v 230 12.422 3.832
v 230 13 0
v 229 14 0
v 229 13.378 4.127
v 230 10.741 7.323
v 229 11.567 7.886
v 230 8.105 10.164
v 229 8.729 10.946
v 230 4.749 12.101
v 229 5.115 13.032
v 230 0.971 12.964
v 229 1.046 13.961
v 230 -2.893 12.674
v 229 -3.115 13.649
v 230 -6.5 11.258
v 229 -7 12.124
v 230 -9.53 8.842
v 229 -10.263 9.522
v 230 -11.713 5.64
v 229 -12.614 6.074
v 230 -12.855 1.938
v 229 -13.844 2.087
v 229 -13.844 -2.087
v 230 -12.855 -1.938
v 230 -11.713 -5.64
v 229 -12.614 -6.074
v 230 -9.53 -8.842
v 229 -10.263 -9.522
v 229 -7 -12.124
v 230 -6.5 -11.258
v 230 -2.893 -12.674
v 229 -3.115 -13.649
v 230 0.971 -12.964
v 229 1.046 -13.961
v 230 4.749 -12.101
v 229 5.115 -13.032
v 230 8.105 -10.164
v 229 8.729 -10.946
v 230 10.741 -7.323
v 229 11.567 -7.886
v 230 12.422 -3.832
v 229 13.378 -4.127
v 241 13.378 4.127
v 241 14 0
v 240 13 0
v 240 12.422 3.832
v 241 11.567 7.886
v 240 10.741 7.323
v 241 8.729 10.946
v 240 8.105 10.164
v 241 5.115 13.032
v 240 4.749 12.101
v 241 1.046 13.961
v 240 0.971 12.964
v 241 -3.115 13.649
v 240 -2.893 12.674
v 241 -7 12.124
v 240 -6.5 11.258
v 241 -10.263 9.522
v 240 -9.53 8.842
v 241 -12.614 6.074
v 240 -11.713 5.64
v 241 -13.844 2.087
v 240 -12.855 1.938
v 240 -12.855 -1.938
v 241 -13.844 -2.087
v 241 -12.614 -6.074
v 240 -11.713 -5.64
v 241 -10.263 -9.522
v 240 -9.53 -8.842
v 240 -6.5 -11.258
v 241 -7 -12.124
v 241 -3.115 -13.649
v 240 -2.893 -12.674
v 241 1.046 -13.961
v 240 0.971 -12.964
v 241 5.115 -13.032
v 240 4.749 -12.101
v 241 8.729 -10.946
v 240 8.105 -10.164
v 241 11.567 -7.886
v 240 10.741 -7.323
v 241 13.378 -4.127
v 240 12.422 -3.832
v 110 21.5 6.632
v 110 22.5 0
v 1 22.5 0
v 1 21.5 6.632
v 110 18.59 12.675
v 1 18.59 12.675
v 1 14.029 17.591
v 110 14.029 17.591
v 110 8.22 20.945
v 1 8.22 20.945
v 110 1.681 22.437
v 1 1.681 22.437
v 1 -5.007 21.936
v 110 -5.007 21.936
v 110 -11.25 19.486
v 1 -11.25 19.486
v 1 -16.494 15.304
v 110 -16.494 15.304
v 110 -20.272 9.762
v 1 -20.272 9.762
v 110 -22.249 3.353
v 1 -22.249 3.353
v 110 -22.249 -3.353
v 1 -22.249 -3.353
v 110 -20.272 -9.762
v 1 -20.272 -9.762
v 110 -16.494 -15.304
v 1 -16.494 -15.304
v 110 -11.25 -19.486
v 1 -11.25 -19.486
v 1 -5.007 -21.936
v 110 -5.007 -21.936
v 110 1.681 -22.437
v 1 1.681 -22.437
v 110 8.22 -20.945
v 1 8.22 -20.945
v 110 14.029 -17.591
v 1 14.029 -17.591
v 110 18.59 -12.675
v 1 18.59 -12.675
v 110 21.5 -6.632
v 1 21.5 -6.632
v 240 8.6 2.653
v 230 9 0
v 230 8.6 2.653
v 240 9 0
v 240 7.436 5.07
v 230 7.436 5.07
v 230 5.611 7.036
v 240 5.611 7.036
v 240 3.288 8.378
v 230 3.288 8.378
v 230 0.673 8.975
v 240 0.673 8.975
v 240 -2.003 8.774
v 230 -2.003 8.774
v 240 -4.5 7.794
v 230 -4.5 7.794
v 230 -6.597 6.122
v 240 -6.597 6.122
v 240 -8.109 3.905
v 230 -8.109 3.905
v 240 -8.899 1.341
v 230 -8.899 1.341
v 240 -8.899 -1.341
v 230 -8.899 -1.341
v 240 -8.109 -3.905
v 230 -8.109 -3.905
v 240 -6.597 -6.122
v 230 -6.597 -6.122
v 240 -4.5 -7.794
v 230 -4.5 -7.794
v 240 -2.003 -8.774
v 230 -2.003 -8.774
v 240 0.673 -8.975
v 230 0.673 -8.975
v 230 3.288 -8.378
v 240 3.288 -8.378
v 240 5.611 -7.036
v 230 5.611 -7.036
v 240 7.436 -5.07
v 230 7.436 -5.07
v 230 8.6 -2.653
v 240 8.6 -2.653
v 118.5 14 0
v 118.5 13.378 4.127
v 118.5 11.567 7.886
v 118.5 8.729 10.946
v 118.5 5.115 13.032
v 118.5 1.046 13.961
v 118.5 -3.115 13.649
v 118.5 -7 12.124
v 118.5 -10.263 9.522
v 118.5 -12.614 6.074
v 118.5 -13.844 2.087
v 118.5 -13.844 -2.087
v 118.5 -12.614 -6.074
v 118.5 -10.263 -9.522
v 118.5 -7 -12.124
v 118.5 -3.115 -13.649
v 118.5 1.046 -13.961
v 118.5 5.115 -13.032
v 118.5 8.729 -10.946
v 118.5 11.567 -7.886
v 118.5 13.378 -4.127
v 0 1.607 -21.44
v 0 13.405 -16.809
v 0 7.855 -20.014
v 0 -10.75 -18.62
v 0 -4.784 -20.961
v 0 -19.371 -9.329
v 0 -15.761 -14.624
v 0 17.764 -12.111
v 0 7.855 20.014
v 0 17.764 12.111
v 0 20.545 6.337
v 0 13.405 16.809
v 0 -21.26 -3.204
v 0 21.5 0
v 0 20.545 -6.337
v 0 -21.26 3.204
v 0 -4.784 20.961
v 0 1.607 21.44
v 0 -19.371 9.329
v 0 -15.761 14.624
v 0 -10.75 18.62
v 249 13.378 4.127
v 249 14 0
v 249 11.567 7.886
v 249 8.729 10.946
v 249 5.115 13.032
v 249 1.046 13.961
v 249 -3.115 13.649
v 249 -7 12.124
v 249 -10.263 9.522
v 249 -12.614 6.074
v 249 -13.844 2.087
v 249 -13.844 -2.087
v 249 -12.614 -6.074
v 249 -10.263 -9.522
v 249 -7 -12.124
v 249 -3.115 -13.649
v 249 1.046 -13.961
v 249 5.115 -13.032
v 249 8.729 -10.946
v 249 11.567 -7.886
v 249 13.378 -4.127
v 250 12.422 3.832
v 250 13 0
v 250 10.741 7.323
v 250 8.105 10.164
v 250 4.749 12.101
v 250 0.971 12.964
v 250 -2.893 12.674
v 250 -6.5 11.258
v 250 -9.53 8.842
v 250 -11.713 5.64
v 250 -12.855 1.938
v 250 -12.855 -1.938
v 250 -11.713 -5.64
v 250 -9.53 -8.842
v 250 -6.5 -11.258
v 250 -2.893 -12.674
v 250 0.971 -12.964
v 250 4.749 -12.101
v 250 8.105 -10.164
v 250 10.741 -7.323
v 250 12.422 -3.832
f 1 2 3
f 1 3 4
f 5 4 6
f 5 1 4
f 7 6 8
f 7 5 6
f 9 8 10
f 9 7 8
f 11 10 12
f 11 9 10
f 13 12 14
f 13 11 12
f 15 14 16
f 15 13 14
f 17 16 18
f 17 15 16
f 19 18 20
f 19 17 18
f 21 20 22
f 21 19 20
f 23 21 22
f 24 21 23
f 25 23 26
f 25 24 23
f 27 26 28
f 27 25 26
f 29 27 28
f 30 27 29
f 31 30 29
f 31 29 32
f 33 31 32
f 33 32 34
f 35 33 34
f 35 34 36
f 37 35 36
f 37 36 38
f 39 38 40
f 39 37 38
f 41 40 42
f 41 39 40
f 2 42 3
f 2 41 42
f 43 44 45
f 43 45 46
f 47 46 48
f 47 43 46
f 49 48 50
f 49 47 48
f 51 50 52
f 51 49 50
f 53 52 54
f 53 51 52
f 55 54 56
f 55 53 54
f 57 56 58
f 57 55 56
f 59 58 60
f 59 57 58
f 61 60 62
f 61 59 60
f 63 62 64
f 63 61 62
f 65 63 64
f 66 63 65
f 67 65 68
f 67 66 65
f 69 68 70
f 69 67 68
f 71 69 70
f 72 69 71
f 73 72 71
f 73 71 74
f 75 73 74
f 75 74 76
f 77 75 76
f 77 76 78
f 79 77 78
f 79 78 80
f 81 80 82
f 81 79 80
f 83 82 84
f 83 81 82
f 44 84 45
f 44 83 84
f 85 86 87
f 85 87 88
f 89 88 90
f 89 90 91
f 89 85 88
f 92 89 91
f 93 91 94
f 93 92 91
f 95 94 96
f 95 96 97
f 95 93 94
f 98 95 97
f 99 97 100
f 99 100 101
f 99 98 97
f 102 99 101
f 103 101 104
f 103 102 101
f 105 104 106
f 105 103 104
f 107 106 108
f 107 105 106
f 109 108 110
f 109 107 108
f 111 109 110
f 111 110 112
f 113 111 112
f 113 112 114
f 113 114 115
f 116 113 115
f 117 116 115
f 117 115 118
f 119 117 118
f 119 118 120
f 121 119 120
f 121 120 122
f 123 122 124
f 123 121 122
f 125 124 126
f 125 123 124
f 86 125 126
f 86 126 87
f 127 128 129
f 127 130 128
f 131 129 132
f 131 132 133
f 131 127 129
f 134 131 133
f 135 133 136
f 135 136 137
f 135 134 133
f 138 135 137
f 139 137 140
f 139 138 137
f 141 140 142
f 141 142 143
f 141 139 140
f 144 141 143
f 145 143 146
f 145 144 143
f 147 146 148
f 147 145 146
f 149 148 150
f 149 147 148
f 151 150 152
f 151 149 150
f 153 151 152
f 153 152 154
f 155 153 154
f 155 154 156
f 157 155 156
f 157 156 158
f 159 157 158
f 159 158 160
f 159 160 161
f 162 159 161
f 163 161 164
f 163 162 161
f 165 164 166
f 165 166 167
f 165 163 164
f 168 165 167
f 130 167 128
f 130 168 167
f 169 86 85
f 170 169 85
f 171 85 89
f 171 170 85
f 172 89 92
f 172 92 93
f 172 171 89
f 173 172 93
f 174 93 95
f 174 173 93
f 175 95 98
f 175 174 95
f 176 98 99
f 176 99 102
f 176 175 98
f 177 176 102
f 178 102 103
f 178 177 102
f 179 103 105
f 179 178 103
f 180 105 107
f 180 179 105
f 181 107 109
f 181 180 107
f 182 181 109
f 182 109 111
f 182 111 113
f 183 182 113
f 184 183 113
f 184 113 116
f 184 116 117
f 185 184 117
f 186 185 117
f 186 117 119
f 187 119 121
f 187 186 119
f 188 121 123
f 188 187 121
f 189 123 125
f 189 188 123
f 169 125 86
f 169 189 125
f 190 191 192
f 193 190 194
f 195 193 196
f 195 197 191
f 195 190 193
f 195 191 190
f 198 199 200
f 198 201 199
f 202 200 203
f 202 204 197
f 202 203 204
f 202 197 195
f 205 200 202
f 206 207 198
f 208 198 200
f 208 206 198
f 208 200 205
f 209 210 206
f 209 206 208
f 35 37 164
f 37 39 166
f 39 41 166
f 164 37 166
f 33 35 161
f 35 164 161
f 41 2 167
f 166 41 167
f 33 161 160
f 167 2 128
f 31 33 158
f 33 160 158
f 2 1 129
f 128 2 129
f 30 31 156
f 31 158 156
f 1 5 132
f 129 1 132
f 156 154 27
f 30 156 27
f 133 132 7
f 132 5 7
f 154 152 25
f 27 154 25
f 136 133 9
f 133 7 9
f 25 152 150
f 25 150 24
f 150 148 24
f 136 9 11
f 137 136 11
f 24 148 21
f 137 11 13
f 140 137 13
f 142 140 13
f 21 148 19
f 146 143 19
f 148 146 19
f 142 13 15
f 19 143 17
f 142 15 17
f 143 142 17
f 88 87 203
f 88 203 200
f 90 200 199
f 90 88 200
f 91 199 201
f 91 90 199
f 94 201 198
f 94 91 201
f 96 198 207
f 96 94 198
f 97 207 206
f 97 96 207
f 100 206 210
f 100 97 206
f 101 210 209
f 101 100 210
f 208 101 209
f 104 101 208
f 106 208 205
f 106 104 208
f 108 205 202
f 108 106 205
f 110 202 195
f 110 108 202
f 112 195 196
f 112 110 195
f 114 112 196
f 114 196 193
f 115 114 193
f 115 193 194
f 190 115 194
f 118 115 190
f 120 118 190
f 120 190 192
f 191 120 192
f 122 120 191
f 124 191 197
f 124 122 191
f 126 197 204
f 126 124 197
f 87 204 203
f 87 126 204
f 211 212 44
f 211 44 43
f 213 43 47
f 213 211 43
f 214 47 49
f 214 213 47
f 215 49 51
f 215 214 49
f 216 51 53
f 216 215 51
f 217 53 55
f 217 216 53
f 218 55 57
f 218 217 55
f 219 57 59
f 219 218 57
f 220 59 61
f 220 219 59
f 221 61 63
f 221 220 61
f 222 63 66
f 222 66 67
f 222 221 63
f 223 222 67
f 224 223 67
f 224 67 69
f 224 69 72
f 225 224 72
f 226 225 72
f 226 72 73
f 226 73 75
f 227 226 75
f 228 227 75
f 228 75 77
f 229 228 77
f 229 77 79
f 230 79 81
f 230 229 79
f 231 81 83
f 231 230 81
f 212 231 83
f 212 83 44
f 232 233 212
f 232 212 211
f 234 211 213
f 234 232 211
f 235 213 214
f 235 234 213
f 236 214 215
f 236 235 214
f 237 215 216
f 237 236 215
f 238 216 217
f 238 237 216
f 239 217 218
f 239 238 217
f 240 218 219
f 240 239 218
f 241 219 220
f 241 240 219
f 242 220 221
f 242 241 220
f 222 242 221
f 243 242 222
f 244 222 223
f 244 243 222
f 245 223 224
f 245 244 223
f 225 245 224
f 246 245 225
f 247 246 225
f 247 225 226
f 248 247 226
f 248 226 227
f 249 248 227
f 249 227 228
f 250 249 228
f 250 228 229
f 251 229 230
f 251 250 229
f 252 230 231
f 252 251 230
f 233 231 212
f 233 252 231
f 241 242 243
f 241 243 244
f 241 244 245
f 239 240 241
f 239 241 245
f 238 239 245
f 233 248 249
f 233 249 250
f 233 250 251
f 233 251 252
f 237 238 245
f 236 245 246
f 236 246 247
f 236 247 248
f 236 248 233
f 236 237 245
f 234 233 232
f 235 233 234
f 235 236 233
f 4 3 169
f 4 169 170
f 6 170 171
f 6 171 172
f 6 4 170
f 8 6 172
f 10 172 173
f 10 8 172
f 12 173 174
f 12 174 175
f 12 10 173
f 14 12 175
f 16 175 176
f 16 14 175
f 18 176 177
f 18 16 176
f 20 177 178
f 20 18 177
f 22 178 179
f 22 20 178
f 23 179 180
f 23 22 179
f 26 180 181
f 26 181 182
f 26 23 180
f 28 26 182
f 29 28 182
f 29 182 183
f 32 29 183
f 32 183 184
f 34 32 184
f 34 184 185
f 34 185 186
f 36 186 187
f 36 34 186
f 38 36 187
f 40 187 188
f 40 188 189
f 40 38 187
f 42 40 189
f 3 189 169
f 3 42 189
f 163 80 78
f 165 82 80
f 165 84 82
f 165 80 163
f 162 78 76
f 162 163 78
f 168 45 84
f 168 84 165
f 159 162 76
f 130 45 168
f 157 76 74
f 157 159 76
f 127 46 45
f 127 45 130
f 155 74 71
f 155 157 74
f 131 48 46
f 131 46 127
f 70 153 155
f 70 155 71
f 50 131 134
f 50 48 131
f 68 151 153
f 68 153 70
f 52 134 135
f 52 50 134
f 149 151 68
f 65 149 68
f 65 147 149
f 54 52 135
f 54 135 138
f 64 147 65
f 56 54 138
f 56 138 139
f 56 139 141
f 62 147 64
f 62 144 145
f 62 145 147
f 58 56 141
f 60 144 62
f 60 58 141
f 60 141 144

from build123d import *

# Parameters (mm, degrees)
SKETCH2_W     = 10
SKETCH2_H     = 5
CHAMFER1_SIZE = 1


with BuildPart() as part:
    # Sketch1 → Revolve1 (revolve)
    with BuildSketch(Plane.XY):
        Polygon((0, 0), (0, 22.5), (110, 22.5), (118.5, 14), (250, 14), (250, 0), align=None)
    revolve(axis=Axis((0, 0, 0), (1, 0, 0)))

    # Sketch2 → Cut-Revolve1 (revolve, cut)
    with BuildSketch(Plane.XY):
        with Locations((235, 11.5)):
            Rectangle(SKETCH2_W, SKETCH2_H)
    revolve(axis=Axis((0, 0, 0), (1, 0, 0)), mode=Mode.SUBTRACT)

    # Chamfer1
    chamfer1_edges = [part.edges().sort_by_distance(p)[0] for p in [
        (230, -14, 0),
        (240, -14, 0),
        (250, -14, 0),
        (0, -22.5, 0),
    ]]
    chamfer(chamfer1_edges, length=CHAMFER1_SIZE)


solid = part.part
